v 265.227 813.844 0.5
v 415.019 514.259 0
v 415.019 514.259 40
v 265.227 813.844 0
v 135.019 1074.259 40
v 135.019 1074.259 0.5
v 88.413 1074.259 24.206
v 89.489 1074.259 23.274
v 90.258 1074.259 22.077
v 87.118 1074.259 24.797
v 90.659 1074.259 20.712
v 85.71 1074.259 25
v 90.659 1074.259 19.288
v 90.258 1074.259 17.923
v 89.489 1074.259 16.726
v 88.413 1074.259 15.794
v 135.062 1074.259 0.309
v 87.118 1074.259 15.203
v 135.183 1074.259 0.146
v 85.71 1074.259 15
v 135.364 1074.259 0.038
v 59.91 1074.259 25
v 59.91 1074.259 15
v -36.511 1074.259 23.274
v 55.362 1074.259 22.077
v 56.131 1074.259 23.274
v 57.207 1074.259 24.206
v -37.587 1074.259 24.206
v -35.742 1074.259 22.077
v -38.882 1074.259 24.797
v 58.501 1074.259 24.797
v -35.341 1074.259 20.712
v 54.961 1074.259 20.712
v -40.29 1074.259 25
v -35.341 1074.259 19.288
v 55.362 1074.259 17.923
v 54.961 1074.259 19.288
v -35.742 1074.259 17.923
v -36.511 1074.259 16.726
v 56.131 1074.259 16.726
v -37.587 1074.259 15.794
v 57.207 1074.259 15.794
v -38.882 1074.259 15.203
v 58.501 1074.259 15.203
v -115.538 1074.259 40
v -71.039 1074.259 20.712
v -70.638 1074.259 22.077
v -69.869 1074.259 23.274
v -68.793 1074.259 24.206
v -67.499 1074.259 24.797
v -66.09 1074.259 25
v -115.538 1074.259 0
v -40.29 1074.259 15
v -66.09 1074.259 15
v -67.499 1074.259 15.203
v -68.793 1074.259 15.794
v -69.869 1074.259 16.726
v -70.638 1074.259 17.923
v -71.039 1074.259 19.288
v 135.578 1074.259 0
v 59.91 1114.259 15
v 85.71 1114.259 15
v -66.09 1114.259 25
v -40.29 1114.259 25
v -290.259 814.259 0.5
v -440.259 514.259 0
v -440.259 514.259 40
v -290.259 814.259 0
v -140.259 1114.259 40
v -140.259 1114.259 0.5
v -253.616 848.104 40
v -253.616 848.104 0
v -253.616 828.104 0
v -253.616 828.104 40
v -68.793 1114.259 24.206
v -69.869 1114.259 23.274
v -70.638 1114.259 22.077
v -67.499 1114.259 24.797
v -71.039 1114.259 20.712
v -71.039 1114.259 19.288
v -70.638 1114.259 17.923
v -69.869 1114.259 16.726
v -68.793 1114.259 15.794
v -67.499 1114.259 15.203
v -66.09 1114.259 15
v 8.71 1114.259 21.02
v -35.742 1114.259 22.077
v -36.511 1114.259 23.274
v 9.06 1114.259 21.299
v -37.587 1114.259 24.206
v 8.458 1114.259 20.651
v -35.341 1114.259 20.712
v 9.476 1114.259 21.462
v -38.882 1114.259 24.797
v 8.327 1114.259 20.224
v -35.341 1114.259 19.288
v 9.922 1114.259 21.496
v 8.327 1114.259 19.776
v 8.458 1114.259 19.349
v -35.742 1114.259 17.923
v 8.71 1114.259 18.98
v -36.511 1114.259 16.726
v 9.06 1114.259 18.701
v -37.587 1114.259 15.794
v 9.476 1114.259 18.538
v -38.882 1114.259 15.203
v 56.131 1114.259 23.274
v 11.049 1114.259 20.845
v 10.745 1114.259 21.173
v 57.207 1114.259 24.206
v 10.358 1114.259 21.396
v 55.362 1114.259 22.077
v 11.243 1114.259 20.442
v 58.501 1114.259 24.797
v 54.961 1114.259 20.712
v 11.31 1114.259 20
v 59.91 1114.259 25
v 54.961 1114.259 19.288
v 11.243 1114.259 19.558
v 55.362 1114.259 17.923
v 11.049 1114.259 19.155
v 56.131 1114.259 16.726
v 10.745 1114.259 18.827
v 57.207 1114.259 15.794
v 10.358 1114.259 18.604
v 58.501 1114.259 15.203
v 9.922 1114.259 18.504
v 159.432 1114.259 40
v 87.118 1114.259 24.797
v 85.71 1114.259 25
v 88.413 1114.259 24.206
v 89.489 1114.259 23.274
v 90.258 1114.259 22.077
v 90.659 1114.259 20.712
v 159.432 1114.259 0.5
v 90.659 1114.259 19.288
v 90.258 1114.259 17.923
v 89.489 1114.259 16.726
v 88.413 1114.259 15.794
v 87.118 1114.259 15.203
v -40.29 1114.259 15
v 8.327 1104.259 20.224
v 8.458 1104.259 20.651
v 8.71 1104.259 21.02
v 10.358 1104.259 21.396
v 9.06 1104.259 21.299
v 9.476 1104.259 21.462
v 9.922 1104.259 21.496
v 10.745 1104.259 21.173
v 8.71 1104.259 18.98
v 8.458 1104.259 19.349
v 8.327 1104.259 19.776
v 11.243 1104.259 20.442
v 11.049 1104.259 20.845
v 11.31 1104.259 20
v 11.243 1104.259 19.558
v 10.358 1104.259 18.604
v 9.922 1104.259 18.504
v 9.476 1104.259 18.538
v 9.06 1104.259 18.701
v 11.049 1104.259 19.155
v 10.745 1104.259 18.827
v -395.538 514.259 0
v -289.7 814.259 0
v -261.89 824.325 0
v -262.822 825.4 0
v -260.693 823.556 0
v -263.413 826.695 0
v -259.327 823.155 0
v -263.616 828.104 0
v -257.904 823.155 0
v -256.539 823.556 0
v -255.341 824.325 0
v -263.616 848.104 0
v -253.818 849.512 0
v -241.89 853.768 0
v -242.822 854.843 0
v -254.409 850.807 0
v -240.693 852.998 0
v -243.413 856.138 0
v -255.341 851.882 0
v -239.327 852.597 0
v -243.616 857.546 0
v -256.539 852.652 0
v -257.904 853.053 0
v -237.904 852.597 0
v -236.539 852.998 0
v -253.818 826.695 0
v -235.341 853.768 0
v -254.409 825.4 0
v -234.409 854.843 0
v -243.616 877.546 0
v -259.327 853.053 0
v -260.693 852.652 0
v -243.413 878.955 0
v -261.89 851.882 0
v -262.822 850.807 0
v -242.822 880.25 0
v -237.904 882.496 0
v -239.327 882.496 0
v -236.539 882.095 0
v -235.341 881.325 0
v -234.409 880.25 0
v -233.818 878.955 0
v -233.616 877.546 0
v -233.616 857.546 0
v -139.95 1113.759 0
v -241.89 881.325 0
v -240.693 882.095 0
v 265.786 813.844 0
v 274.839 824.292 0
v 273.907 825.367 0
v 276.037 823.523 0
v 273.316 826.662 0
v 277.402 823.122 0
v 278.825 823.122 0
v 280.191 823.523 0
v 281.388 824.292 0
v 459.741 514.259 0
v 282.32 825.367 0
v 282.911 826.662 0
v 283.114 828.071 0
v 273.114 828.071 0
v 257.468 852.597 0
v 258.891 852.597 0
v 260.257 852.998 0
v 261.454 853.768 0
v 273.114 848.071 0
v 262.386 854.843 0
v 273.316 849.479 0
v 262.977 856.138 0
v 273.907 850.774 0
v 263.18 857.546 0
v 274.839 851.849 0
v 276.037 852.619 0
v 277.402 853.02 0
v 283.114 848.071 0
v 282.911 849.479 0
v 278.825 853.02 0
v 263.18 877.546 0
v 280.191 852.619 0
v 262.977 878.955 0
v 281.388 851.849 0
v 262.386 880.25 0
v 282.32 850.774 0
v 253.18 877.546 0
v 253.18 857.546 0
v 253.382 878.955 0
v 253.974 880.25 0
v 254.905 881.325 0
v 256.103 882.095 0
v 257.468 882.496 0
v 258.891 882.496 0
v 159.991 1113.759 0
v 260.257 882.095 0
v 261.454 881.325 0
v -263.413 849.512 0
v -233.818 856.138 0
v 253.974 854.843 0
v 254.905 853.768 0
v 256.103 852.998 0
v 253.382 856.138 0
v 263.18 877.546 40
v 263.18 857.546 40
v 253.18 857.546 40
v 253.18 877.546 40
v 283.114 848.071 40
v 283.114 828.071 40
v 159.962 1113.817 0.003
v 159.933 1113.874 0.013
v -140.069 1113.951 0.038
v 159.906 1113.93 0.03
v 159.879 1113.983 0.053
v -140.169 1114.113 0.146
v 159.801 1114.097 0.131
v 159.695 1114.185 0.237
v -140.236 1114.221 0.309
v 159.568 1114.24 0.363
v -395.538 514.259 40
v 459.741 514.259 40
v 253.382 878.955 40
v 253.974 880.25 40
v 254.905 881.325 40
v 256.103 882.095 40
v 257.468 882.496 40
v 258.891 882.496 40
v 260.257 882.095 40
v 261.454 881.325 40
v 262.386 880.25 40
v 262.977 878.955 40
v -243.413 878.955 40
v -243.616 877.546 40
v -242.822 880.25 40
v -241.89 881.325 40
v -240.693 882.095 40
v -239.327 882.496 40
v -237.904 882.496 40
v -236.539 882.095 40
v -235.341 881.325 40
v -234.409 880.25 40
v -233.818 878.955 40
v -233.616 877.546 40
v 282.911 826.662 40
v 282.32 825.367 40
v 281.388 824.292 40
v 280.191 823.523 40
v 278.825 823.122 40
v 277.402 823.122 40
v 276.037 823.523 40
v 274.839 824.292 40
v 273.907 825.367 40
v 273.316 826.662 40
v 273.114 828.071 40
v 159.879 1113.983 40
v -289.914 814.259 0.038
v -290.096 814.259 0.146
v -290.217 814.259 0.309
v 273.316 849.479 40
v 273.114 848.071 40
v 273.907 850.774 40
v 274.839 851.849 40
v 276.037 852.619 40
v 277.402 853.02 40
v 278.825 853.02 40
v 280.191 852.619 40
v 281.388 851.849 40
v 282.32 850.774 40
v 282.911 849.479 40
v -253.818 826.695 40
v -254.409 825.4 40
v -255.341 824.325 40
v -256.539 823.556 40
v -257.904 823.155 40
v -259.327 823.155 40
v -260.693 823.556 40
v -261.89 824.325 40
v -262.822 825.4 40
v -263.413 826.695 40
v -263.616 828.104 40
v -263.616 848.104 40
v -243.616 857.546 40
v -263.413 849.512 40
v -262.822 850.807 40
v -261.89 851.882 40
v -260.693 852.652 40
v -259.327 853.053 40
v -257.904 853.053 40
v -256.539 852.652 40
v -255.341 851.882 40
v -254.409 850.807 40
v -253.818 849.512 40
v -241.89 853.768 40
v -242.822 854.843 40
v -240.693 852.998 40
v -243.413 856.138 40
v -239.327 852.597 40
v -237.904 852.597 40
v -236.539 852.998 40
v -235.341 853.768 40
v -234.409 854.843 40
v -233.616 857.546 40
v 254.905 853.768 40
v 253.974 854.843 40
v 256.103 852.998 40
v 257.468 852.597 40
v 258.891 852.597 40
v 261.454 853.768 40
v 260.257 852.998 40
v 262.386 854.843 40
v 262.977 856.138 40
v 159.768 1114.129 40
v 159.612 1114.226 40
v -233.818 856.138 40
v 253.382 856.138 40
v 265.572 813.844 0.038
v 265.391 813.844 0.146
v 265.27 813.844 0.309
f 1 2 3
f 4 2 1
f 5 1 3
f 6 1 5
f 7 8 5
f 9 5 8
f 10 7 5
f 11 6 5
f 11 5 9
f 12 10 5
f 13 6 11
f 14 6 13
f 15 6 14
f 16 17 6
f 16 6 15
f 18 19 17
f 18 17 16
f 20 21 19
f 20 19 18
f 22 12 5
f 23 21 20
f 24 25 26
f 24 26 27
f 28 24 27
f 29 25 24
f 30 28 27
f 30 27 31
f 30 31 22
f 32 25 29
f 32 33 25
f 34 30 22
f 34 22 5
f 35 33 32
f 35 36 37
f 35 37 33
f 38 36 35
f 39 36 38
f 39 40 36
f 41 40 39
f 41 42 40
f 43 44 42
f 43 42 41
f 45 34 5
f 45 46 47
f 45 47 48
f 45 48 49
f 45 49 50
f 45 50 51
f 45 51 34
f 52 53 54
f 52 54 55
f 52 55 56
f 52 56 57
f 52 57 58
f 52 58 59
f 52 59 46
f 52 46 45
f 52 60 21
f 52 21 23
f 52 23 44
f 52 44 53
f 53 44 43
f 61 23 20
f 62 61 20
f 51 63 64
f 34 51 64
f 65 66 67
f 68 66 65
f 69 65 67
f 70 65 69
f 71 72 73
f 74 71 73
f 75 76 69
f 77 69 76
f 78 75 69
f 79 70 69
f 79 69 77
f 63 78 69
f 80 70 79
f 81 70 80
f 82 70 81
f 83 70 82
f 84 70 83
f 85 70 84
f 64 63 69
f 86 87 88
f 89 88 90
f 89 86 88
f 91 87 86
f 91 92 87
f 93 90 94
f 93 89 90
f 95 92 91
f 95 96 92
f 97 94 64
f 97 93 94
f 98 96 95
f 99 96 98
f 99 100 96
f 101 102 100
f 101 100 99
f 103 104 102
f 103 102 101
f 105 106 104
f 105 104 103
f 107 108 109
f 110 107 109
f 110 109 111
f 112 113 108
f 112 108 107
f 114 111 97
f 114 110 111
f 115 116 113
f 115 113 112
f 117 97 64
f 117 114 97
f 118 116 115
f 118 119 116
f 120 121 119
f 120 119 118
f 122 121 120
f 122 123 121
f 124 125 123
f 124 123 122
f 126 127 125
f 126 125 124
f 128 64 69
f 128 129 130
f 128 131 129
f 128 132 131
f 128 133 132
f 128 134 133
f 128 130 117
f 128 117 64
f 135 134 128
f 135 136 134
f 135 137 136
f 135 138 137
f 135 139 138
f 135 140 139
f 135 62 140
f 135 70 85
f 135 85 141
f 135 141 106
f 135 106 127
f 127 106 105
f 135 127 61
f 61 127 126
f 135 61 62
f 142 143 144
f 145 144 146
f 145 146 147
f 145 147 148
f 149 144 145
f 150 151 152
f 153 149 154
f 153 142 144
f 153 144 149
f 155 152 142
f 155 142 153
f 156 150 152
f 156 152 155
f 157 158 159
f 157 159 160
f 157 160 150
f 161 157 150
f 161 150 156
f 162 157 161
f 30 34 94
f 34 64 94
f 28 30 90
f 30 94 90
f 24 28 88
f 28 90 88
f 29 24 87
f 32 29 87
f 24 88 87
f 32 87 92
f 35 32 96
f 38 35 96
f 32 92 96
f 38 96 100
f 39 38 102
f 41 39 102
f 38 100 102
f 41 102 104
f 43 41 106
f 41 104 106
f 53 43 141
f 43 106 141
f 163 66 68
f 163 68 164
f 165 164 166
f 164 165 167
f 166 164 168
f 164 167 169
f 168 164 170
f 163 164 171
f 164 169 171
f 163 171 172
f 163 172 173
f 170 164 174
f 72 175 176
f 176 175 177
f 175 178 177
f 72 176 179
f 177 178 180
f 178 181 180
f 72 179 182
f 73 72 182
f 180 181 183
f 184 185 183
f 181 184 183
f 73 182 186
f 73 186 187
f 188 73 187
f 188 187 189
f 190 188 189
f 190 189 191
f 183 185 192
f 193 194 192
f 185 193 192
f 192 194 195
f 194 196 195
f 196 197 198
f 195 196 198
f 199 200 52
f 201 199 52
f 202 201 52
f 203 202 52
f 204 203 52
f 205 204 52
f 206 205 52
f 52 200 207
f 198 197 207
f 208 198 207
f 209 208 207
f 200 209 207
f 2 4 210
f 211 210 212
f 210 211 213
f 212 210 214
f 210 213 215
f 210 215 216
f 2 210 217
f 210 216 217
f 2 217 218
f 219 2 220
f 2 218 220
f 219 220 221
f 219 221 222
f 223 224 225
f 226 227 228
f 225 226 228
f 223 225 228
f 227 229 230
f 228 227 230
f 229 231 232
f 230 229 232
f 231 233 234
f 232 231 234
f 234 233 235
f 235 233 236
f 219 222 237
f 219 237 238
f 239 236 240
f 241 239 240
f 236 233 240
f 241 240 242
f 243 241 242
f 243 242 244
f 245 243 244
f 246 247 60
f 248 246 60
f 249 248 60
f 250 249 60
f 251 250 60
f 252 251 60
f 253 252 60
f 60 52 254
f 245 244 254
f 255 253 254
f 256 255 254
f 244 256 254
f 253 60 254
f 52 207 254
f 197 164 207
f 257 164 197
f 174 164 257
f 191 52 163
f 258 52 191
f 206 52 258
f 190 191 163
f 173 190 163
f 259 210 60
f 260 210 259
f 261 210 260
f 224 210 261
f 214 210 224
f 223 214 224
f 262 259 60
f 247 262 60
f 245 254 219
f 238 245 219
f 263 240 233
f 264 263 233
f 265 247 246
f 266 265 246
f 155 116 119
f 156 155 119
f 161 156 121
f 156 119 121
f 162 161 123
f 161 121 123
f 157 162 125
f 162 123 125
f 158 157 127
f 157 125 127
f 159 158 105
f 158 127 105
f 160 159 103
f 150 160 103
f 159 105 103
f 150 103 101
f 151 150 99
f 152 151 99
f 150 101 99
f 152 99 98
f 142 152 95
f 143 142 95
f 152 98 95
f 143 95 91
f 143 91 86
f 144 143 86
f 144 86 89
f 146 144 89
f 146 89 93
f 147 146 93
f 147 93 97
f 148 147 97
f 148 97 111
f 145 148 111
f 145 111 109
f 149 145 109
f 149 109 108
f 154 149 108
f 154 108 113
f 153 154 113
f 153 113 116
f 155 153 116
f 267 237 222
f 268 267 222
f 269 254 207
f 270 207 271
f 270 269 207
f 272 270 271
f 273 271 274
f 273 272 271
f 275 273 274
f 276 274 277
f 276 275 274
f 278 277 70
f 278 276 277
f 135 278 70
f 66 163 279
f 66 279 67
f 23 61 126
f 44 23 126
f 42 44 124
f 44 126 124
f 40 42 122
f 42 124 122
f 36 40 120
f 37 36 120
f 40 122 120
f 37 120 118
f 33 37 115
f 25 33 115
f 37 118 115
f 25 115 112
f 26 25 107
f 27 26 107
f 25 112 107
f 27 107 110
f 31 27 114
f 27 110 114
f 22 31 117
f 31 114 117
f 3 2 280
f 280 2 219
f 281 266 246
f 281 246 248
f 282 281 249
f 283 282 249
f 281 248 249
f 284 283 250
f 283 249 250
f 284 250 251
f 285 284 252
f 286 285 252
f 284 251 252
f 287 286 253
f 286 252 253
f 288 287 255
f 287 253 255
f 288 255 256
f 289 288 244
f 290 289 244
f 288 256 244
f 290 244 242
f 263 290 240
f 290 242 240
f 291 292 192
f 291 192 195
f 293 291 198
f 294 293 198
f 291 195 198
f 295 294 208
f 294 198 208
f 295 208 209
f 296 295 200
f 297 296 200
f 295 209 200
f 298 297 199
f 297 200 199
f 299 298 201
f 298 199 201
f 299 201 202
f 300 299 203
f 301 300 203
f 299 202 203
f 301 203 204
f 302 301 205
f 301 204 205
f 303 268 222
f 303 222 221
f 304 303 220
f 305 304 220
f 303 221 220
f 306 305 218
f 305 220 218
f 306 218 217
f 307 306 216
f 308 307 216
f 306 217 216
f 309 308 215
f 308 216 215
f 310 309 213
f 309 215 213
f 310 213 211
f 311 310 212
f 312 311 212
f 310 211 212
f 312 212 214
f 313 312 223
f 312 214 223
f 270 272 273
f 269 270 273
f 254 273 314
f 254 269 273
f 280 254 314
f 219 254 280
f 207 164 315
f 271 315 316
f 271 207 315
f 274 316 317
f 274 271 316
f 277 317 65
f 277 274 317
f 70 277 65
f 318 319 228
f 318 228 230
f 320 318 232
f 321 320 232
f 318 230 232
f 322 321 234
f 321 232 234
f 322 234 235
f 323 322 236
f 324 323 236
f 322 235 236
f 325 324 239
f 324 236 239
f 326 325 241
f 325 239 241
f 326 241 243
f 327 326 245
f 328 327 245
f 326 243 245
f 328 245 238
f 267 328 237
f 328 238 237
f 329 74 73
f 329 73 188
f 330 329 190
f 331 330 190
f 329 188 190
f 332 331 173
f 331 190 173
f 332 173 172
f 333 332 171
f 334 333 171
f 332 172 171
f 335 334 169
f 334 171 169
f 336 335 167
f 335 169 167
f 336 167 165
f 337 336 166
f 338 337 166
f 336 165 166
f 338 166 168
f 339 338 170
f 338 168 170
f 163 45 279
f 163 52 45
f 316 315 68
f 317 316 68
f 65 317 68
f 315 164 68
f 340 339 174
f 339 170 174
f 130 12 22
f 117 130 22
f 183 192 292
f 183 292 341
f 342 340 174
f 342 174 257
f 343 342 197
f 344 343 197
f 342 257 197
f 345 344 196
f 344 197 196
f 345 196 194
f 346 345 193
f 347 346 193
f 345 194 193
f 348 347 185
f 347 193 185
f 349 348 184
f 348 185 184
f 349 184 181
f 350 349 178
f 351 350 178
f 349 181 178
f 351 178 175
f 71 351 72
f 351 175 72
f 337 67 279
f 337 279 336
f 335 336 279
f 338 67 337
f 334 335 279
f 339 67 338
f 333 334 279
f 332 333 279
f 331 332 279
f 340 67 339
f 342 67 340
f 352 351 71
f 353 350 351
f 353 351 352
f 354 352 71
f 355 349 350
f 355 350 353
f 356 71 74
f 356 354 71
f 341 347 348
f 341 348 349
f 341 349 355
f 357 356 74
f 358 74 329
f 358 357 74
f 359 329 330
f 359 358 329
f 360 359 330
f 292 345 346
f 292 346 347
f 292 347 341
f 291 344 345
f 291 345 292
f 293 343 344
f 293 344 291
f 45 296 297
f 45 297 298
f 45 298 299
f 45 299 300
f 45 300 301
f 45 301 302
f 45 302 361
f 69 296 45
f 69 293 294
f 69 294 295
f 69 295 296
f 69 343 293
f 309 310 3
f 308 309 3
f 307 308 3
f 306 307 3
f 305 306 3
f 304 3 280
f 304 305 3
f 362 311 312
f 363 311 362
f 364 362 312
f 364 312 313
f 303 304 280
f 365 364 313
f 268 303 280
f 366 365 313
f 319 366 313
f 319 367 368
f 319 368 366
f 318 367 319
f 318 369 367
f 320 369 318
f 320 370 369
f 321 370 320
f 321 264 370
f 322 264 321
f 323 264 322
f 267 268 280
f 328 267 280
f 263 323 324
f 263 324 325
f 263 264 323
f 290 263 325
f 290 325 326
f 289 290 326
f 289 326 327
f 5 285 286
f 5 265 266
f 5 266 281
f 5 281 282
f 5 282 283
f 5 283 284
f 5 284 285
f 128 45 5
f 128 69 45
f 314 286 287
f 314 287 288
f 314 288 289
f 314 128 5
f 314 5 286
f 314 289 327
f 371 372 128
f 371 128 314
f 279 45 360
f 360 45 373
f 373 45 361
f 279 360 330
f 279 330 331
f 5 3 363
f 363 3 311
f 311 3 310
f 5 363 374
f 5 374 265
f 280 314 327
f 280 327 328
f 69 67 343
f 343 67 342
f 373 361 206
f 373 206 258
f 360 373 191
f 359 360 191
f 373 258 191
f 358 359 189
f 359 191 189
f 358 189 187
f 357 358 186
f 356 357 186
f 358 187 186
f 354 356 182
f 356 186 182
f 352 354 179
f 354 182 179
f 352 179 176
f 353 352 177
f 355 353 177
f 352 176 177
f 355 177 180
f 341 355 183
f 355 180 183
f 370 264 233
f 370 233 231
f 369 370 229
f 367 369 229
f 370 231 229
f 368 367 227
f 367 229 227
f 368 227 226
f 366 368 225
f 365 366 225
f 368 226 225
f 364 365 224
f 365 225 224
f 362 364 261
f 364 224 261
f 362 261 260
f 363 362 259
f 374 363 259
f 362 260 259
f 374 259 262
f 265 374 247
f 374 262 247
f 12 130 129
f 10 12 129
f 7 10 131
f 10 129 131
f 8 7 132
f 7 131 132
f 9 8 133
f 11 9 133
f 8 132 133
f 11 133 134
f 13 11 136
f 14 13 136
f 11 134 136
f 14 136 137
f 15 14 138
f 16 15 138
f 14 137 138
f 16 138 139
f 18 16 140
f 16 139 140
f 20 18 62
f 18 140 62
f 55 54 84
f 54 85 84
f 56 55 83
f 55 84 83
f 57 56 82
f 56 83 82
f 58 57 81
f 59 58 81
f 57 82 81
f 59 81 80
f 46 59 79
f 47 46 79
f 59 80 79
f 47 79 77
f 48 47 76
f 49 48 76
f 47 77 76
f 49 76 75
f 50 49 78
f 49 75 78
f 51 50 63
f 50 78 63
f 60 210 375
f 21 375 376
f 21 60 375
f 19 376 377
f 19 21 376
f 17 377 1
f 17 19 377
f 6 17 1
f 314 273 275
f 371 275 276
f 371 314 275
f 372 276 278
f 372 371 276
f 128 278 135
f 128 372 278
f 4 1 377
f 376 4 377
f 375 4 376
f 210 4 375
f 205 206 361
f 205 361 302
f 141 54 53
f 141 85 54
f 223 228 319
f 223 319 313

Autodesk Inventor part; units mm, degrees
ref_plane "YZ Plane" through (0, 0, 0) normal (1, 0, 0) x (0, 1, 0)
ref_plane "XZ Plane" through (0, 0, 0) normal (0, 1, 0) x (-1, 0, 0)
ref_plane "XY Plane" through (0, 0, 0) normal (0, 0, 1) x (1, 0, 0)
sketch "Sketch1" plane through (0, 0, 0) normal (0, 0, 1) x (1, 0, 0)
  line L0 (9.7407, 1114.2593) -> (159.7407, 1114.2593)
  line L1 (9.7407, 1114.2593) -> (-140.2593, 1114.2593)
  line L2 (-290.2593, 814.2593) -> (-140.2593, 1114.2593)
  line L3 (159.7407, 1114.2593) -> (459.7407, 514.2593)
  line L4 (135.0194, 1074.2593) -> (9.7407, 1074.2593)
  line L5 (9.7407, 1074.2593) -> (-115.5379, 1074.2593)
  line L6 (-115.5379, 1074.2593) -> (-245.5379, 814.2593)
  line L7 (9.7407, 1114.2593) -> (159.7407, 1114.2593)
  line L8 (9.7407, 1114.2593) -> (-140.2593, 1114.2593)
  line L9 (-440.2593, 514.2593) -> (-140.2593, 1114.2593)
  line L10 (159.7407, 1114.2593) -> (309.9483, 813.8441)
  line L11 (135.0194, 1074.2593) -> (9.7407, 1074.2593)
  line L12 (9.7407, 1074.2593) -> (-115.5379, 1074.2593)
  line L13 (-115.5379, 1074.2593) -> (-245.5379, 814.2593)
  line L14 (-245.5379, 814.2593) -> (-290.2593, 814.2593)
  line L15 (265.227, 813.8441) -> (309.9483, 813.8441)
  line L16 (265.227, 813.8441) -> (135.0194, 1074.2593)
  line L17 (415.0194, 514.2593) -> (135.0194, 1074.2593)
  line L18 (-395.5379, 514.2593) -> (-440.2593, 514.2593)
  line L19 (-245.5379, 814.2593) -> (-395.5379, 514.2593)
  line L20 (-440.2593, 514.2593) -> (-395.5379, 514.2593)
  line L21 (415.0194, 514.2593) -> (459.7407, 514.2593)
  point P0 (0, 0)
  dimension "d13" = 300
extrude "Extrusion1" add sketch "Sketch1" along normal blind 40 contours L0 L3 L15 L16 L4 L5 L6 L14 L2 L1
fillet "Fillet2" radius 0.5 1 edges at (200.1232, 944.0517, 0)
fillet "Fillet3" radius 0.5 3 edges at (159.7407, 1114.2593, 20) (84.7407, 1114.2593, 0) (-215.2593, 964.2593, 0)
sketch "Sketch2" plane through (-140.2593, 1114.2593, 0.5) normal (0, 1, 0) x (1, 0, 0)
  line L0 (300.1382, -39.5) -> (300.1382, 0.4472) projected
  line L1 (300.1382, -19.5) -> (0, -19.5)
  line L2 (0, 0) -> (0, -39.5) projected
  circle A0 centre (150.0691, -19.5) radius 1.5
  point P0 (140.2593, 0.5)
  point P1 (300.1382, -39)
  point P2 (300.1382, 0)
  point P3 (0, -39)
  dimension "d14" = 3
extrude "Extrusion2" cut sketch "Sketch2" against normal blind 10
extrude "Extrusion3" add sketch "Sketch1" along normal blind 40 contours L3 L21 L17 L15 | L14 L19 L18 L9
sketch "Sketch3" plane through (-140.2593, 1114.2593, 0.5) normal (0, 1, 0) x (1, 0, 0)
  point P0 (140.2593, 0.5)
sketch "Sketch4" plane through (-140.2593, 1114.2593, 0.5) normal (0, 1, 0) x (1, 0, 0)
  circle A0 centre (150.0691, -19.5) radius 1.5 projected
  line L0 (0, 0) -> (299.691, 0) projected
  line L1 (0, 0) -> (0, -39.5) projected
  line L2 (299.691, 0) -> (299.691, -39.5) projected
  line L3 (200.1691, -14.5) -> (225.9691, -14.5) projected
  line L4 (225.9691, -24.5) -> (200.1691, -24.5) projected
  arc A1 (225.9691, -24.5) -> (225.9691, -14.5) centre (225.9691, -19.5) ccw projected
  arc A2 (200.1691, -14.5) -> (200.1691, -24.5) centre (200.1691, -19.5) ccw projected
  arc A3 (74.1691, -14.5) -> (74.1691, -24.5) centre (74.1691, -19.5) ccw projected
  line L5 (74.1691, -14.5) -> (99.9691, -14.5) projected
  line L6 (74.1691, -24.5) -> (99.9691, -24.5) projected
  arc A4 (99.9691, -24.5) -> (99.9691, -14.5) centre (99.9691, -19.5) ccw projected
  line L7 (299.691, -39.5) -> (0, -39.5) projected
  point P0 (140.2593, 0.5)
extrude "Extrusion4" cut sketch "Sketch4" against normal blind 50 contours L3 A1 L4 A2 | L5 A4 L6 A3
sketch "Esboço5" plane through (0, 0, 0) normal (0, 0, 1) x (1, 0, 0)
  line L0 (159.4317, 1114.2593) -> (-140.2593, 1114.2593) projected
  line L1 (-94.9789, 1114.2593) -> (-94.9789, 897.5465)
  line L2 (-94.9789, 897.5465) -> (-260.935, 897.5465)
  line L3 (-290.2593, 814.2593) -> (-140.2593, 1114.2593) projected
  line L4 (-250.2227, 877.5465) -> (-250.2227, 857.5465)
  line L5 (265.227, 813.8441) -> (135.0194, 1074.2593) projected
  line L6 (223.3758, 897.5465) -> (233.3758, 897.5465)
  line L7 (233.3758, 897.5465) -> (233.3758, 882.5465)
  line L8 (-94.9789, 897.5465) -> (445.9224, 897.5465)
  line L9 (268.1798, 897.5465) -> (258.1798, 897.5465)
  line L10 (268.1798, 897.5465) -> (258.1798, 897.5465)
  line L11 (258.1798, 897.5465) -> (258.1798, 882.5465)
  line L12 (258.1798, 882.5465) -> (258.1798, 877.5465)
  line L13 (258.1798, 862.5465) -> (258.1798, 857.5465)
  line L14 (258.1798, 857.5465) -> (258.1798, 852.5465)
  arc A0 (253.1798, 857.5465) -> (263.1798, 857.5465) centre (258.1798, 857.5465) ccw
  arc A1 (263.1798, 877.5465) -> (253.1798, 877.5465) centre (258.1798, 877.5465) ccw
  line L15 (263.1798, 877.5465) -> (263.1798, 857.5465)
  line L16 (253.1798, 857.5465) -> (253.1798, 877.5465)
  line L17 (-248.6157, 897.5465) -> (-293.337, 808.1037)
  line L18 (268.1798, 897.5465) -> (312.835, 808.0707)
  line L19 (459.7407, 514.2593) -> (159.9907, 1113.7593) projected
  line L20 (-293.337, 808.1037) -> (-248.6157, 808.1037)
  line L21 (-395.5379, 514.2593) -> (-115.5379, 1074.2593) projected
  line L22 (-248.6157, 808.1037) -> (-258.6157, 808.1037)
  line L23 (-258.6157, 808.1037) -> (-258.6157, 823.1037)
  line L24 (-258.6157, 823.1037) -> (-258.6157, 828.1037)
  line L25 (-258.6157, 848.1037) -> (-258.6157, 853.1037)
  arc A2 (-253.6157, 848.1037) -> (-263.6157, 848.1037) centre (-258.6157, 848.1037) ccw
  arc A3 (-263.6157, 828.1037) -> (-253.6157, 828.1037) centre (-258.6157, 828.1037) ccw
  line L26 (-263.6157, 828.1037) -> (-263.6157, 848.1037)
  line L27 (-253.6157, 848.1037) -> (-253.6157, 828.1037)
  line L28 (-258.6157, 828.1037) -> (-258.6157, 833.1037)
  line L29 (-258.6157, 843.1037) -> (-258.6157, 848.1037)
  line L30 (312.835, 808.0707) -> (268.1137, 808.0707)
  line L31 (135.0194, 1074.2593) -> (415.0194, 514.2593) projected
  line L32 (268.1137, 808.0707) -> (278.1137, 808.0707)
  line L33 (278.1137, 808.0707) -> (278.1137, 823.0707)
  line L34 (278.1137, 823.0707) -> (278.1137, 828.0707)
  line L35 (278.1137, 848.0707) -> (278.1137, 853.0707)
  arc A4 (283.1137, 848.0707) -> (273.1137, 848.0707) centre (278.1137, 848.0707) ccw
  arc A5 (273.1137, 828.0707) -> (283.1137, 828.0707) centre (278.1137, 828.0707) ccw
  line L36 (273.1137, 848.0707) -> (273.1137, 828.0707)
  line L37 (283.1137, 848.0707) -> (283.1137, 828.0707)
  line L38 (278.1137, 828.0707) -> (278.1137, 833.0707)
  line L39 (278.1137, 843.0707) -> (278.1137, 848.0707)
  line L40 (-238.6157, 882.5465) -> (-238.6157, 862.5465)
  line L41 (-233.6157, 862.5465) -> (-233.6157, 882.5465)
  line L42 (-243.6157, 882.5465) -> (-243.6157, 862.5465)
  line L43 (-248.6157, 897.5465) -> (-238.6157, 897.5465)
  line L44 (-238.6157, 897.5465) -> (-238.6157, 882.5465)
  line L45 (-293.337, 808.1037) -> (-248.6157, 808.1037)
  line L46 (-248.6157, 897.5465) -> (-238.6157, 897.5465)
  line L47 (-238.6157, 897.5465) -> (-238.6157, 882.5465)
  line L48 (-238.6157, 882.5465) -> (-238.6157, 877.5465)
  line L49 (-238.6157, 857.5465) -> (-238.6157, 852.5465)
  arc A6 (-243.6157, 857.5465) -> (-233.6157, 857.5465) centre (-238.6157, 857.5465) ccw
  arc A7 (-233.6157, 877.5465) -> (-243.6157, 877.5465) centre (-238.6157, 877.5465) ccw
  line L50 (-243.6157, 877.5465) -> (-243.6157, 857.5465)
  line L51 (-233.6157, 857.5465) -> (-233.6157, 877.5465)
  line L52 (-238.6157, 877.5465) -> (-238.6157, 872.5465)
  line L53 (-238.6157, 862.5465) -> (-238.6157, 857.5465)
  point P0 (0, 0)
  dimension "d23" = 216.7128
  dimension "d33" = 10
  dimension "d34" = 15
  dimension "d35" = 5
  dimension "d37" = 20
  dimension "d38" = 5
  dimension "d39" = 10
  dimension "d40" = 100
  dimension "d41" = 100
  dimension "d42" = 10
  dimension "d43" = 15
  dimension "d44" = 5
  dimension "d45" = 20
  dimension "d46" = 5
  dimension "d47" = 10
  dimension "d48" = 10
  dimension "d49" = 10
  dimension "d50" = 15
  dimension "d51" = 5
  dimension "d52" = 20
  dimension "d53" = 5
  dimension "d54" = 10
  dimension "d55" = 10
  dimension "d69" = 10
  dimension "d70" = 15
  dimension "d71" = 5
  dimension "d72" = 20
  dimension "d73" = 5
  dimension "d74" = 10
  dimension "d75" = 10
extrude "Extrusão5" cut sketch "Esboço5" along normal mid plane 1000 contours A5 L36 A4 L37 | A1 L15 A0 L16 | A3 L26 A2 L27 | A7 L41 L51 A6 L49 L53 L40 | L40 L53 L49 A6 L50 L42 A7
sketch "Esboço8" plane through (0, 0, 40) normal (0, 0, 1) x (1, 0, 0)
  point P0 (0, 0)
properties part number "Cavalete_Inferior" material "SAE 1010/1020"
